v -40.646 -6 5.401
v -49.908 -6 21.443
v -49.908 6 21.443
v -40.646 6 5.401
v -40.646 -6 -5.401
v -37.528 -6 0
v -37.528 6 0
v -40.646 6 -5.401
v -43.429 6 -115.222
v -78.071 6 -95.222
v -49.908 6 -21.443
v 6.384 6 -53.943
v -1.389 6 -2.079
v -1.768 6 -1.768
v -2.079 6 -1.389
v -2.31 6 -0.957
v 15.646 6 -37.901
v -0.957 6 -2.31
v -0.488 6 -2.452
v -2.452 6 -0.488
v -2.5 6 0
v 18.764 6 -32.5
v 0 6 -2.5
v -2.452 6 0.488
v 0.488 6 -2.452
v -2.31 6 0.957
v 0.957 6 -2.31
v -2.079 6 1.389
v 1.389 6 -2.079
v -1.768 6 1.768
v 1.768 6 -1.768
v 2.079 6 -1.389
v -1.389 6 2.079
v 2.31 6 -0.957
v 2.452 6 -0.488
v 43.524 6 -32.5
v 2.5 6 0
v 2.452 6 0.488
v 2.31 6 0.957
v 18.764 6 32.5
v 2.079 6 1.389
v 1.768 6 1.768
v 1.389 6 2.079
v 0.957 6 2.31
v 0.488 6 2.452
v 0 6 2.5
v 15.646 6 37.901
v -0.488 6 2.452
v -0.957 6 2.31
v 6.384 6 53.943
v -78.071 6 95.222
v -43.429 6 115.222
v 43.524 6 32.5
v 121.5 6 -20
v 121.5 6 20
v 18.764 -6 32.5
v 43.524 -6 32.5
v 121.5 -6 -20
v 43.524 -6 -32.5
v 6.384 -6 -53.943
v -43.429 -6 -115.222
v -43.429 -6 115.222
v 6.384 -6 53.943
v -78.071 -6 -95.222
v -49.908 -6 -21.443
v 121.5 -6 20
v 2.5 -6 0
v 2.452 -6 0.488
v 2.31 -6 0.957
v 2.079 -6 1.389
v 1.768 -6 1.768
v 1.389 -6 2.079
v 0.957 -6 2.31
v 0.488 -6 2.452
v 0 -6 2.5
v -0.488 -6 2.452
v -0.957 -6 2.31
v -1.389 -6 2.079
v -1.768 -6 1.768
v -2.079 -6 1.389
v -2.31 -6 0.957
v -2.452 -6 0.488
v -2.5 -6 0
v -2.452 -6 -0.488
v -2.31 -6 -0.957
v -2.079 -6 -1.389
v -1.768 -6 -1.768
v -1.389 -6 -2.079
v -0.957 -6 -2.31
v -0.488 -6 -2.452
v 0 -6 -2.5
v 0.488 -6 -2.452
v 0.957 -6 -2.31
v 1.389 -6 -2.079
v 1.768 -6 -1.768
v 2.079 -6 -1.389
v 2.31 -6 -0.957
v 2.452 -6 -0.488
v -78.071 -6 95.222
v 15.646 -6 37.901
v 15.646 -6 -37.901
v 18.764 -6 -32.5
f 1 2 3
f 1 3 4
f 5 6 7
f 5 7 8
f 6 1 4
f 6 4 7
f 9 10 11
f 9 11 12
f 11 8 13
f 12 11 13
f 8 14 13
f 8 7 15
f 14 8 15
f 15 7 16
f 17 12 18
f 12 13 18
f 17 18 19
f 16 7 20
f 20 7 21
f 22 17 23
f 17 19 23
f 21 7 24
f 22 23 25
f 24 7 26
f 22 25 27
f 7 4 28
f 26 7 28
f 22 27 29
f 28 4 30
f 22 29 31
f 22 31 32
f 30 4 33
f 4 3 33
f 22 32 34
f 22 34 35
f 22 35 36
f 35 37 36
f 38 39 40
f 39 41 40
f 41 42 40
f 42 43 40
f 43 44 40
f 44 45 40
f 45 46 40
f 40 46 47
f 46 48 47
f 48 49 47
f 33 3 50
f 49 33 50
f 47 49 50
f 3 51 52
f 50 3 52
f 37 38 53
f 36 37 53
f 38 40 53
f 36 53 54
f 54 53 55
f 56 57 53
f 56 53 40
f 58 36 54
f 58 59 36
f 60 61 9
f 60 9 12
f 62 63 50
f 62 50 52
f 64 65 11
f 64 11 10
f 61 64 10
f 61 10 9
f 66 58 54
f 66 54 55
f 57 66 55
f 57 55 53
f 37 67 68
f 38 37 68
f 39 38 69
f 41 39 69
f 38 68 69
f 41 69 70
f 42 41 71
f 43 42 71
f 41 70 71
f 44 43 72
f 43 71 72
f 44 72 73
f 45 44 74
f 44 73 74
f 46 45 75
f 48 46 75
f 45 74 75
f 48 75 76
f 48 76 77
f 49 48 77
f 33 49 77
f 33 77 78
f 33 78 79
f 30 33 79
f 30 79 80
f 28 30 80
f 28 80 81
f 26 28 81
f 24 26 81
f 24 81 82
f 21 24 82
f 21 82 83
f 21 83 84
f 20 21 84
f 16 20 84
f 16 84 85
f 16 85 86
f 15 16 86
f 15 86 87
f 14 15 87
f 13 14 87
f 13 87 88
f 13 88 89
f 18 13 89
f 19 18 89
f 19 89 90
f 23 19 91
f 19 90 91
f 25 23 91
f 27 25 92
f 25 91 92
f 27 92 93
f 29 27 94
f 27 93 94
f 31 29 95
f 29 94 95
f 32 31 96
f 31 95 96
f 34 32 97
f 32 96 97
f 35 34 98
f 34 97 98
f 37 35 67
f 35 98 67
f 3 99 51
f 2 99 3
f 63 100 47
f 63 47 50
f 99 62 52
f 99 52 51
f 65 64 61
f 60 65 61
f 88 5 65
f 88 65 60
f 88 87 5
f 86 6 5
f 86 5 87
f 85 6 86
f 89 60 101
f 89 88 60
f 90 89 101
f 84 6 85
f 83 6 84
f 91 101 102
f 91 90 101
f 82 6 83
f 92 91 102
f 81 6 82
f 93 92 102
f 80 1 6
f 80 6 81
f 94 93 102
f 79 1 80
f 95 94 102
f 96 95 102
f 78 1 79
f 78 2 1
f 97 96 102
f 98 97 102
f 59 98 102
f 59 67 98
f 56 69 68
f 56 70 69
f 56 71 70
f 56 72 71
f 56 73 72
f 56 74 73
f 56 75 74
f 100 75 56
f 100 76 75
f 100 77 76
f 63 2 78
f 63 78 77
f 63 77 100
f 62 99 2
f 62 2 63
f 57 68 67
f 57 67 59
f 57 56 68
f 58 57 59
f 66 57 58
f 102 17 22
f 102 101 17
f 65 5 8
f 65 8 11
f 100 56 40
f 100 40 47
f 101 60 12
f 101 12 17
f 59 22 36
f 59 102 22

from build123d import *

# Parameters (mm, degrees)
F1_DEPTH = 6
F2_R     = 2.5
F3_DEPTH = 12.001


# Not quite as in the source:
# - a feature names something its author has since deleted; it is built from what else it names


with BuildPart() as f1:
    # F0 (on Front) → F1 (new body, symmetric)
    with BuildSketch(Plane.XZ):
        Polygon((43.524, -32.5), (121.5, -20), (121.5, 20), (43.524, 32.5), (25, 32.5), (18.7638837487, 32.5), (15.645825623, 37.9006350946), (6.383825623, 53.9428896743), (-43.4294919243, 115.2220865598), (-78.0705080757, 95.2220865598), (-49.907825623, 21.4428896743), (-40.645825623, 5.4006350946), (-37.5277674973, 0), (-40.645825623, -5.4006350946), (-49.907825623, -21.4428896743), (-78.0705080757, -95.2220865598), (-43.4294919243, -115.2220865598), (6.383825623, -53.9428896743), (15.645825623, -37.9006350946), (18.7638837487, -32.5), (25, -32.5), align=None)
    extrude(amount=F1_DEPTH, both=True)

    # F2 (on face) → F3 (cut, through all)
    with BuildSketch(Plane.XZ.offset(6)):
        Circle(F2_R)
    extrude(amount=-F3_DEPTH, mode=Mode.SUBTRACT)


solid = f1.part
